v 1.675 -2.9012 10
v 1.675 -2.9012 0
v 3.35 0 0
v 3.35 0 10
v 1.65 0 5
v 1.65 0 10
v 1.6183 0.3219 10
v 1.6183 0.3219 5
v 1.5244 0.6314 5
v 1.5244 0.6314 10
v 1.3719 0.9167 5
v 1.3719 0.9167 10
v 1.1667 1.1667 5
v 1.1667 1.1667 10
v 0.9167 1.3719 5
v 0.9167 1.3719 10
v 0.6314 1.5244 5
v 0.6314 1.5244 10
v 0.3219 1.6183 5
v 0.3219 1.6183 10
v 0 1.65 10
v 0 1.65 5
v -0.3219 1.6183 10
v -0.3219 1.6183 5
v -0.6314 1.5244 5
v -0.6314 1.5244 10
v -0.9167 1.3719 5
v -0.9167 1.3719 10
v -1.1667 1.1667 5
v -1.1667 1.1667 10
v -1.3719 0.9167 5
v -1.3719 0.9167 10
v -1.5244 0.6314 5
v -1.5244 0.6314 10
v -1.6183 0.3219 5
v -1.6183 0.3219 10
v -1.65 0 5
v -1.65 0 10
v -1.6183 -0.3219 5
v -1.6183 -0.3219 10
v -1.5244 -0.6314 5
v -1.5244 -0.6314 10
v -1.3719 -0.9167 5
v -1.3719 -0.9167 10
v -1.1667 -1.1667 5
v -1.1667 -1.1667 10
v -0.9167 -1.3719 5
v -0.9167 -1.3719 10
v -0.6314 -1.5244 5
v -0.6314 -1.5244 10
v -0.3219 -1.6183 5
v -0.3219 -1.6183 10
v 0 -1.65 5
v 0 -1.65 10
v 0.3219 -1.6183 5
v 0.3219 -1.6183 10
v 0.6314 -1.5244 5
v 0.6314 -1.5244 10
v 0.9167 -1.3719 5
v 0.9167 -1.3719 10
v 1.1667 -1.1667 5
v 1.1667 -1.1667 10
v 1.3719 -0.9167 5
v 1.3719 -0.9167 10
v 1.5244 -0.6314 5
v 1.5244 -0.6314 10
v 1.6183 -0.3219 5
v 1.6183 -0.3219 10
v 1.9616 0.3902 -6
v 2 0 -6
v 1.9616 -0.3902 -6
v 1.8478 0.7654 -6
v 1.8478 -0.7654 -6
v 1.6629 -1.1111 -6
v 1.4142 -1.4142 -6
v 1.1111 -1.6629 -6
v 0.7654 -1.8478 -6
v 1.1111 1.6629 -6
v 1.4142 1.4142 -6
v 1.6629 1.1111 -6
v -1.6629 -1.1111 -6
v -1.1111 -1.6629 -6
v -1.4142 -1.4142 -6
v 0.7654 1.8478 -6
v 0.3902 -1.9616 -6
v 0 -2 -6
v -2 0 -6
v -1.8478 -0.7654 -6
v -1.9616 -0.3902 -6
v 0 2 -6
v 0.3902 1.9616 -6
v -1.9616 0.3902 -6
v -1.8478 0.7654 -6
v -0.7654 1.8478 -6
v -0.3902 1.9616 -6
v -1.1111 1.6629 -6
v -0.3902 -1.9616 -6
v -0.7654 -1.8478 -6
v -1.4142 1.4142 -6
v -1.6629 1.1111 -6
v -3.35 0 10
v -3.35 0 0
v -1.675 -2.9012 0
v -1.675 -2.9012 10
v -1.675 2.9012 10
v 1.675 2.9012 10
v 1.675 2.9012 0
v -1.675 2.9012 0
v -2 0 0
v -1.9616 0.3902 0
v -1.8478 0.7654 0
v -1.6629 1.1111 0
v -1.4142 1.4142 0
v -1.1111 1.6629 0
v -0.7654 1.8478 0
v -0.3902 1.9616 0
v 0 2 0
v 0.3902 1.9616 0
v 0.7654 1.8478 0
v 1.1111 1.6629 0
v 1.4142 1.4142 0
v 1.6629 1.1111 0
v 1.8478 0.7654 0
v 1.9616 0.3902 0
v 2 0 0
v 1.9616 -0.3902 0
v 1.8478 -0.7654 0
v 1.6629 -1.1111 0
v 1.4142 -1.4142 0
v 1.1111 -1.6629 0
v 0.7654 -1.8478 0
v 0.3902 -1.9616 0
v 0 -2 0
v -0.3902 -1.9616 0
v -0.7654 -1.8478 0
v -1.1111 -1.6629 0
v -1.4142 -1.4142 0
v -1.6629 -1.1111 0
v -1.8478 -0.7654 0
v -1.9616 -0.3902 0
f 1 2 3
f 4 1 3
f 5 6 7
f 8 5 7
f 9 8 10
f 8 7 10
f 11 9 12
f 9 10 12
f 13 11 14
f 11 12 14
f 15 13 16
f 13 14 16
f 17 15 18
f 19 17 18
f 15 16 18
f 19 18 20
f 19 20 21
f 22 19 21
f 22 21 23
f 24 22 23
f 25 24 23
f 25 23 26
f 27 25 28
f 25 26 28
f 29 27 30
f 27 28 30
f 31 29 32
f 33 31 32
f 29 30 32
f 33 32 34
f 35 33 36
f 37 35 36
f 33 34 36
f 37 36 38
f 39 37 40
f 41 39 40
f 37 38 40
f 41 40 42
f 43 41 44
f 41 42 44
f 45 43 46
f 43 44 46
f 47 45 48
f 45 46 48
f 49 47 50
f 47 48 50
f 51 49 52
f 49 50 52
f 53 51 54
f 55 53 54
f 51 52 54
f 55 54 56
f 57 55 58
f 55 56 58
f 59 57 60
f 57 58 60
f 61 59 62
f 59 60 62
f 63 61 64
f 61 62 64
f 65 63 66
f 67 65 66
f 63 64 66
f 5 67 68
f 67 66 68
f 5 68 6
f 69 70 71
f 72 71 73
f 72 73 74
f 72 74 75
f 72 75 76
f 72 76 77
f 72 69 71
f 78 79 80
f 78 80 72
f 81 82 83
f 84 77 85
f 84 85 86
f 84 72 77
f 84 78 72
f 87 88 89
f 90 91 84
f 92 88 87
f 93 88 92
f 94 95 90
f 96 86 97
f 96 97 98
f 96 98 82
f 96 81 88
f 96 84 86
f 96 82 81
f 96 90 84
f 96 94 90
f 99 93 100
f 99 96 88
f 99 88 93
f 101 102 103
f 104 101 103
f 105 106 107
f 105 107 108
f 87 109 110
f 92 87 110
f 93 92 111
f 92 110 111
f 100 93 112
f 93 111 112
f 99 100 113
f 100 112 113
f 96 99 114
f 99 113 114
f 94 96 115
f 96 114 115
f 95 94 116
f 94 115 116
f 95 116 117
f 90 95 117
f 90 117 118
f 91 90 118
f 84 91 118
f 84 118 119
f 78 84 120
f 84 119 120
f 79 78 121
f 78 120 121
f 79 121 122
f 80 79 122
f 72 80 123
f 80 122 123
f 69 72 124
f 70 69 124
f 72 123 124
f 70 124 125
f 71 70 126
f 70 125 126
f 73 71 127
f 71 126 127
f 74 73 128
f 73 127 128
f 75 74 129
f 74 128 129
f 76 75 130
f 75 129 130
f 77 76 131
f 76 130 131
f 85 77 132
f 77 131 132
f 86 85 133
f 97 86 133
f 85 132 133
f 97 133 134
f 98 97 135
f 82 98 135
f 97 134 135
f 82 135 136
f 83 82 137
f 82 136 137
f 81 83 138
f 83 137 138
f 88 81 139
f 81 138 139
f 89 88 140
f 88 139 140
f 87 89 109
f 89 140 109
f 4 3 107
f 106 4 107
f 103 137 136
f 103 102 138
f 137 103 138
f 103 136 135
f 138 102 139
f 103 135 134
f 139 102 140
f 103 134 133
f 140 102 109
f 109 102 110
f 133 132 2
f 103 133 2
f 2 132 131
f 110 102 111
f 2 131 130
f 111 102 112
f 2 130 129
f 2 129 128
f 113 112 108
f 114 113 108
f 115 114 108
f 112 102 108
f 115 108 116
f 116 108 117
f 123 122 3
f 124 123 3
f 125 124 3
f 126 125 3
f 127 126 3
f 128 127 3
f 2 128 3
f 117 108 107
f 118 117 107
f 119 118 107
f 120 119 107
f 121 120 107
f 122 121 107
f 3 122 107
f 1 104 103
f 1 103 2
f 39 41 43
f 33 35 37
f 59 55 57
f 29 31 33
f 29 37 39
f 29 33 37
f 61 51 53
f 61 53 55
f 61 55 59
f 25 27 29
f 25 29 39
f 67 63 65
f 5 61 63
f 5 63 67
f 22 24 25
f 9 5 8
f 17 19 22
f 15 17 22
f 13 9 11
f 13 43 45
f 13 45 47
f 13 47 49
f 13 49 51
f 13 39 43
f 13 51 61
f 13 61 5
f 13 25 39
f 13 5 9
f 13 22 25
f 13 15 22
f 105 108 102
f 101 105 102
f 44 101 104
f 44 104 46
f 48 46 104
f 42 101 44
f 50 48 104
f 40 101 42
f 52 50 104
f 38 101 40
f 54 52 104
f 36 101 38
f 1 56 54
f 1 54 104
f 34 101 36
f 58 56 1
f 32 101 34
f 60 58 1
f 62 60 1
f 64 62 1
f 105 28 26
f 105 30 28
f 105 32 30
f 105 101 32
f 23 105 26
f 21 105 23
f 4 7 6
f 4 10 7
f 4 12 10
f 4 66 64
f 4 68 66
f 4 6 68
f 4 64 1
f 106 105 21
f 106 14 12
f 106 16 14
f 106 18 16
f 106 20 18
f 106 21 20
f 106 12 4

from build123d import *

# Parameters (mm, degrees)
EXTRUDE_1_DEPTH     = 10
SKETCH_2_R          = 2
EXTRUDE_2_DEPTH     = 6
SKETCH_3_R          = 1.65
CUT_EXTRUDE_1_DEPTH = 5


with BuildPart() as part:
    # 草圖1 → 填料-伸長1 (new body)
    with BuildSketch(Plane.XY):
        Polygon((1.675, 2.901185103), (-1.675, 2.901185103), (-3.35, 0), (-1.675, -2.901185103), (1.675, -2.901185103), (3.35, 0), align=None)
    extrude(amount=EXTRUDE_1_DEPTH)

    # 草圖2 → 填料-伸長2 (add)
    with BuildSketch(Plane(origin=(0, 0, 0), x_dir=(-1, 0, 0), z_dir=(0, 0, -1))):
        Circle(SKETCH_2_R)
    extrude(amount=EXTRUDE_2_DEPTH)

    # 草圖3 → 除料-伸長1 (cut)
    with BuildSketch(Plane.XY.offset(10)):
        Circle(SKETCH_3_R)
    extrude(amount=-CUT_EXTRUDE_1_DEPTH, mode=Mode.SUBTRACT)


solid = part.part
